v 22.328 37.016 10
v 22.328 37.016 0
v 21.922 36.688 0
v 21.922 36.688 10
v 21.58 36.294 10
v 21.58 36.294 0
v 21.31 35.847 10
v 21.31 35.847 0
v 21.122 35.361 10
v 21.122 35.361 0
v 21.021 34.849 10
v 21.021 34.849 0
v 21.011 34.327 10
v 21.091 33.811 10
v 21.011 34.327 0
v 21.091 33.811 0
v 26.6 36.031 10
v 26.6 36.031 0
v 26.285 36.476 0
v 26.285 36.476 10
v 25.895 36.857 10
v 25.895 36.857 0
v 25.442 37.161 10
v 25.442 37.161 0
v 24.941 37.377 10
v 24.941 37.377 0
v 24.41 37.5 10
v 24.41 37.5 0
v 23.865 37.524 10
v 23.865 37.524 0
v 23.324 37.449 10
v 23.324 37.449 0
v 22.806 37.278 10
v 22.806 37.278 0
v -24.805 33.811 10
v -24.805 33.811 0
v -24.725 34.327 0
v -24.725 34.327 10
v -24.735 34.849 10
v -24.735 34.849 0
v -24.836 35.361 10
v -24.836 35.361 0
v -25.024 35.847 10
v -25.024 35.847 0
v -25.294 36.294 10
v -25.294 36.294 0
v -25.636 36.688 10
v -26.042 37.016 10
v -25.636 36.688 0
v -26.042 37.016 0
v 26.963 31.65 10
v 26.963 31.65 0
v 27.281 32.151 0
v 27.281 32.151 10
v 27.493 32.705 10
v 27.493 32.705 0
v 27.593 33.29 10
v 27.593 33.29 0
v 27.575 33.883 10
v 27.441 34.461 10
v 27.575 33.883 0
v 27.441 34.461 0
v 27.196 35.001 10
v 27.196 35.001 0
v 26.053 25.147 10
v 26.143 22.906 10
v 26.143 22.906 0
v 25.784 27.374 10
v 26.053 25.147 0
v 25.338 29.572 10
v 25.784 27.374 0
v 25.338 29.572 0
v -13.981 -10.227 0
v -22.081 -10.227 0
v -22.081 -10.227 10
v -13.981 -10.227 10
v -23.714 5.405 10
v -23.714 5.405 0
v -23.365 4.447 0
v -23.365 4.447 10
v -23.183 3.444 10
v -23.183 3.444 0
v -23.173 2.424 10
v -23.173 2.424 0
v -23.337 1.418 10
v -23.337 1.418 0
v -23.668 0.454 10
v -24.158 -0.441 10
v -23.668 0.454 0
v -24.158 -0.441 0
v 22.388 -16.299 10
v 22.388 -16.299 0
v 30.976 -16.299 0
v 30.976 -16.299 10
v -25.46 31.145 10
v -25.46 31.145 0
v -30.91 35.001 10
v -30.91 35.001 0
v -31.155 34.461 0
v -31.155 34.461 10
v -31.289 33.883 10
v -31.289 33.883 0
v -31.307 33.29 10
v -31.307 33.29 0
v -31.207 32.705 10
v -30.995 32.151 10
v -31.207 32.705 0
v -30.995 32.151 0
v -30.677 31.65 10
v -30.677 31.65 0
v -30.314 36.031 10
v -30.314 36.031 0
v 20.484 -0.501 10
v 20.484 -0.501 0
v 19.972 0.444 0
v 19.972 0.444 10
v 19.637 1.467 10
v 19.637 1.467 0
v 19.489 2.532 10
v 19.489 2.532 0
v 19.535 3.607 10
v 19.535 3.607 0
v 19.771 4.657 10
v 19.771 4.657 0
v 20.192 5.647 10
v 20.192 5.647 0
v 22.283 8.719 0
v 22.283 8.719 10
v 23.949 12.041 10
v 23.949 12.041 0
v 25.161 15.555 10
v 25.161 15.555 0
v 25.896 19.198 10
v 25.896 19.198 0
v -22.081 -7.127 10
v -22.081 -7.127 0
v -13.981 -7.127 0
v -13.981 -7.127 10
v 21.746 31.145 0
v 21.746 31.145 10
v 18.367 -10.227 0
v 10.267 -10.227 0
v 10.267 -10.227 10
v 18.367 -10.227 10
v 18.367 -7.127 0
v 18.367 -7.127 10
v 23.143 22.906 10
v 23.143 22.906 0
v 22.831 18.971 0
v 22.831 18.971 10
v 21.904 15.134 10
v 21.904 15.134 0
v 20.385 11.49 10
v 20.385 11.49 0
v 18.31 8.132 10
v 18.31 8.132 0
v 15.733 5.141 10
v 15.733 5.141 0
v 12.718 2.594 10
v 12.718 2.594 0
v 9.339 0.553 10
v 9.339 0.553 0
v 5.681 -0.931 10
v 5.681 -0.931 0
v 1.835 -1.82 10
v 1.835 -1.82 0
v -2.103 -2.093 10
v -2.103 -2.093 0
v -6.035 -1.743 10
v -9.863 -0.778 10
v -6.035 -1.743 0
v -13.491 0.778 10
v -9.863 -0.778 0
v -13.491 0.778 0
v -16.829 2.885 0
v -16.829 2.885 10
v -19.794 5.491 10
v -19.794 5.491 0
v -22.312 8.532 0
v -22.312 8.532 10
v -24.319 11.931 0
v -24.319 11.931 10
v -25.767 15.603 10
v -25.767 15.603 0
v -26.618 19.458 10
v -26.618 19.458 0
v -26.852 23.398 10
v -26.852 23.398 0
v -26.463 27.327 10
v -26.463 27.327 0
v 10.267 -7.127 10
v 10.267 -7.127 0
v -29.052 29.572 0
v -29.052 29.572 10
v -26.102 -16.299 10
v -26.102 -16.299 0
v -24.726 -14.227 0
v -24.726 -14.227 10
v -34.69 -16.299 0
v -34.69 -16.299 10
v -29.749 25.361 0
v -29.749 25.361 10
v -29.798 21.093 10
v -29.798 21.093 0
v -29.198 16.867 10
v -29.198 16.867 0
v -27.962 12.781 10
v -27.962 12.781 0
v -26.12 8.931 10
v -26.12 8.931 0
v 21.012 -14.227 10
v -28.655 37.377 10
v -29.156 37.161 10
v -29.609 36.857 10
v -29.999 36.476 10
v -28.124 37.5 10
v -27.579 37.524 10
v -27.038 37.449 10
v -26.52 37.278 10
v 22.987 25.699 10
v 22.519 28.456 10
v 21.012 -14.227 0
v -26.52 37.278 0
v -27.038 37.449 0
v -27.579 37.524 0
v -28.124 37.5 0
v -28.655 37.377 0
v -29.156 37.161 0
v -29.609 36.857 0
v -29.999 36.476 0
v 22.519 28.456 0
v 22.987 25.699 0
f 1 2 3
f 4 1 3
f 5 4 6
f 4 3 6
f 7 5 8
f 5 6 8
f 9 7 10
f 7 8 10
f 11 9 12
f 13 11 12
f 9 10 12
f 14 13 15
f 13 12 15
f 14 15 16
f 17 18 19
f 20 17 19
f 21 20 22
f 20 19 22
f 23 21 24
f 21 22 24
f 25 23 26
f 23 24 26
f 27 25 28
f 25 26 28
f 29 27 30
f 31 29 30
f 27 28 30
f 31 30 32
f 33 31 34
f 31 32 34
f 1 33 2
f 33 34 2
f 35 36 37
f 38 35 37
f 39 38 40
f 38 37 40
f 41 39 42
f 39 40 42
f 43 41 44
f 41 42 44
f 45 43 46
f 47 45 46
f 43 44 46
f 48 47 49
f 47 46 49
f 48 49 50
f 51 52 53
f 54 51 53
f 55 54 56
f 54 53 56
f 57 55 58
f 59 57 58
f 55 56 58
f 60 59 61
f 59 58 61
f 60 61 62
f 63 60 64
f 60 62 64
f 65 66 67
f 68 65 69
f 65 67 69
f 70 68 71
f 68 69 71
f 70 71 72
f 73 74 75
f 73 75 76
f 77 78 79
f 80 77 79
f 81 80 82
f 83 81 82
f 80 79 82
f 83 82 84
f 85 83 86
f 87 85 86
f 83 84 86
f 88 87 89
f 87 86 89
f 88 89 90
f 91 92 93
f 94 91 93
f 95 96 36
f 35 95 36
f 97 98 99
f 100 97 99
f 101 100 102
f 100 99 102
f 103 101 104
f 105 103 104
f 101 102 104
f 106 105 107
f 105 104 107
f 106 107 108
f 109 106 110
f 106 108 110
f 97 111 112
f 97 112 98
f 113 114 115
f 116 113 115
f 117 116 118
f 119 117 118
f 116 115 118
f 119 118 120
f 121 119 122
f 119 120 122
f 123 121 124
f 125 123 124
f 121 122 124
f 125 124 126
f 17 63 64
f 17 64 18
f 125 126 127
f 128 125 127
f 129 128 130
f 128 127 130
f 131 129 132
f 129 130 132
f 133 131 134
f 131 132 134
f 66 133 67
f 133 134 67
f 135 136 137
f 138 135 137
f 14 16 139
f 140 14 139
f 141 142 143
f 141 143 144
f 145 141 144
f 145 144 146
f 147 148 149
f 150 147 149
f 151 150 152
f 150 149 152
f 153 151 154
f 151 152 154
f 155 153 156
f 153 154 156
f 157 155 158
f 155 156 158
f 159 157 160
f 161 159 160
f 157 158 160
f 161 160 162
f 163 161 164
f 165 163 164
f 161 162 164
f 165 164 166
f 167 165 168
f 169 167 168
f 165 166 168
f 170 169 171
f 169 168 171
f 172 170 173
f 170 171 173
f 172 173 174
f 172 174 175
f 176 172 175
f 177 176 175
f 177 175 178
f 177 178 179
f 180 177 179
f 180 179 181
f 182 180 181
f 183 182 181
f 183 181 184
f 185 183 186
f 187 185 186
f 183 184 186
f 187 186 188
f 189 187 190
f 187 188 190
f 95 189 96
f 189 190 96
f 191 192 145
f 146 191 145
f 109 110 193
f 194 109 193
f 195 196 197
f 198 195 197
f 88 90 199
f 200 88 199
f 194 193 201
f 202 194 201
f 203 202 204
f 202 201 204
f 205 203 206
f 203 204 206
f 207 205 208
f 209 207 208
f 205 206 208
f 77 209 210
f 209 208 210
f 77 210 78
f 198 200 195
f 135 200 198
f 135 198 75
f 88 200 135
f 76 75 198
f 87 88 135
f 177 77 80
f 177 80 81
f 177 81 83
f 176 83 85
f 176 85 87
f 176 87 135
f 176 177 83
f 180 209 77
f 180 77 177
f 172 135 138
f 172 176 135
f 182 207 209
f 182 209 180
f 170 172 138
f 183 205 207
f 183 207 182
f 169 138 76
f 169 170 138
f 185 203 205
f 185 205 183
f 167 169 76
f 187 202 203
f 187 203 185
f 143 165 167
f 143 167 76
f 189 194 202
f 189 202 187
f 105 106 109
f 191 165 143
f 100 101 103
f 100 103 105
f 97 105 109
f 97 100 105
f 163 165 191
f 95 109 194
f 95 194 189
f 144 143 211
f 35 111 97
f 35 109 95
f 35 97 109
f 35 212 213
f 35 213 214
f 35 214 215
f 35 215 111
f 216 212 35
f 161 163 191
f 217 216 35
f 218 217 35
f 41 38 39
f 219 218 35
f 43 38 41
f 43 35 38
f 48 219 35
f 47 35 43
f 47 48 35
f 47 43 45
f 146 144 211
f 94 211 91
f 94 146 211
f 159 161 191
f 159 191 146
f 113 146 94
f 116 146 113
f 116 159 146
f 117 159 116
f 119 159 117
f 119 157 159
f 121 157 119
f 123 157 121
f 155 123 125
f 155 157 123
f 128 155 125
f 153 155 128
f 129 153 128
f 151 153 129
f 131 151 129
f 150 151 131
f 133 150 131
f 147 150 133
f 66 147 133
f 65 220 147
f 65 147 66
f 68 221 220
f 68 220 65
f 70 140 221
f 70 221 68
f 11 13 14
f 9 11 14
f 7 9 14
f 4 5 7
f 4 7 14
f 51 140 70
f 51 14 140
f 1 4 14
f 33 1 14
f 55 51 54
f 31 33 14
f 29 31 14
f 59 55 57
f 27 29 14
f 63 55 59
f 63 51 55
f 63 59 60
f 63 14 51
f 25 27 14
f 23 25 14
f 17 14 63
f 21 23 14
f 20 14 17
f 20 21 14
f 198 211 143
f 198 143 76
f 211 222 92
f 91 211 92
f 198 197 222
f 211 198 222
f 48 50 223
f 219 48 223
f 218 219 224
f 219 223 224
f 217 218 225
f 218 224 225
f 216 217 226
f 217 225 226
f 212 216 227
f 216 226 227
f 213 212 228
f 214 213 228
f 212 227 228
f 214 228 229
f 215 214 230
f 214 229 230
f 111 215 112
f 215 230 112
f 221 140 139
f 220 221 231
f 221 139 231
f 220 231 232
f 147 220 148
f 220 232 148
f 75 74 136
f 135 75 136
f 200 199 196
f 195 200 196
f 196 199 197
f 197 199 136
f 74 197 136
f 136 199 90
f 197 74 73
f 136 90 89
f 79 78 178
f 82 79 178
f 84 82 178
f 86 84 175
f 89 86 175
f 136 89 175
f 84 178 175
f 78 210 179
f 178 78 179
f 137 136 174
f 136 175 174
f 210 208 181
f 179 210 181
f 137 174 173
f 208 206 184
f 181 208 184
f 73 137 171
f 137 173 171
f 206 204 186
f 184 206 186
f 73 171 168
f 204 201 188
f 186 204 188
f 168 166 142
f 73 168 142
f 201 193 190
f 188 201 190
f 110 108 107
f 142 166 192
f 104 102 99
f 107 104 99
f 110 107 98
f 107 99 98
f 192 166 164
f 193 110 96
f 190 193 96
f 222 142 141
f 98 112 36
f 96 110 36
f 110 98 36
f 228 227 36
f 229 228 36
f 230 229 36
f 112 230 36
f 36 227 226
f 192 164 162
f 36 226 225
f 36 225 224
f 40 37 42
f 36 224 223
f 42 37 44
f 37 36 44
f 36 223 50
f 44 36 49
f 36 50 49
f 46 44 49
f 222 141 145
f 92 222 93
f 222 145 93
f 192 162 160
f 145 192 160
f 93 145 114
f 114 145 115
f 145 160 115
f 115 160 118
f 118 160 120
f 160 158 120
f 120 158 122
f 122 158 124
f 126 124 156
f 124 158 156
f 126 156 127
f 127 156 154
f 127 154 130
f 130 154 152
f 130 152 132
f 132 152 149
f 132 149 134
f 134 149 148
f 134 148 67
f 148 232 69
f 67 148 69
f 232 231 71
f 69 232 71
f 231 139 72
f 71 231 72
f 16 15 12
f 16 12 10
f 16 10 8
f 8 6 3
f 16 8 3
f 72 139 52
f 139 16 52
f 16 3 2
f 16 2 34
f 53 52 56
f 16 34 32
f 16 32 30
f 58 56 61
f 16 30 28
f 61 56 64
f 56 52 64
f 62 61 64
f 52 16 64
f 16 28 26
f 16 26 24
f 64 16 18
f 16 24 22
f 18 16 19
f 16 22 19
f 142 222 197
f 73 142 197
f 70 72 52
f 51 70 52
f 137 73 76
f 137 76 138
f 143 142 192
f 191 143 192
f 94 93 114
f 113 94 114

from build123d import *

# Parameters (mm, degrees)
F0_W     = 8.1
F0_H     = 3.1
F1_DEPTH = 10


with BuildPart() as f1:
    # F0 (on Top) → F1 (new body)
    with BuildSketch(Plane.XY):
        with BuildLine():
            ThreePointArc((-29.051798, 29.572342), (-29.198001, 16.866823), (-23.713784, 5.404932))
            ThreePointArc((-23.713784, 5.404932), (-1.702548, -5.093764), (20.19153, 5.647114))
            ThreePointArc((20.19153, 5.647114), (24.613354, 13.777795), (26.143006, 22.90581))
            ThreePointArc((26.143006, 22.90581), (25.940978, 26.263301), (25.33781, 29.572342))
            ThreePointArc((25.33781, 29.572342), (24.101087, 33.402381), (22.32803, 37.015544))
            ThreePointArc((22.32803, 37.015544), (21.20556, 35.608031), (21.090924, 33.811397))
            Line((21.090924, 33.811397), (21.746385, 31.144773))
            ThreePointArc((21.746385, 31.144773), (22.791378, 27.084059), (23.143006, 22.90581))
            ThreePointArc((23.143006, 22.90581), (-6.035243, -1.742562), (-25.460373, 31.144773))
            Line((-25.460373, 31.144773), (-24.804912, 33.811397))
            ThreePointArc((-24.804912, 33.811397), (-24.919548, 35.608031), (-26.042018, 37.015544))
            ThreePointArc((-26.042018, 37.015544), (-27.815075, 33.402381), (-29.051798, 29.572342))
        make_face()
        with BuildLine():
            Line((-30.676976, 31.650005), (-29.051798, 29.572342))
            ThreePointArc((-29.051798, 29.572342), (-27.815075, 33.402381), (-26.042018, 37.015544))
            ThreePointArc((-26.042018, 37.015544), (-28.392122, 37.45081), (-30.314474, 36.030595))
            Line((-30.314474, 36.030595), (-30.910288, 35.001461))
            ThreePointArc((-30.910288, 35.001461), (-31.306766, 33.290011), (-30.676976, 31.650005))
        make_face()
        with BuildLine():
            ThreePointArc((26.600486, 36.030595), (24.678134, 37.45081), (22.32803, 37.015544))
            ThreePointArc((22.32803, 37.015544), (24.101087, 33.402381), (25.33781, 29.572342))
            Line((25.33781, 29.572342), (26.962988, 31.650005))
            ThreePointArc((26.962988, 31.650005), (27.592778, 33.290011), (27.1963, 35.001461))
            Line((27.1963, 35.001461), (26.600486, 36.030595))
        make_face()
        with BuildLine():
            ThreePointArc((-23.713784, 5.404932), (-23.173383, 2.424271), (-24.15798, -0.440505))
            Line((-24.15798, -0.440505), (-34.690085, -16.299085))
            Line((-34.690085, -16.299085), (-26.101912, -16.299085))
            Line((-26.101912, -16.299085), (-24.726056, -14.227407))
            Line((-24.726056, -14.227407), (-1.856994, -14.227407))
            Line((-1.856994, -14.227407), (21.012068, -14.227407))
            Line((21.012068, -14.227407), (22.387924, -16.299085))
            Line((22.387924, -16.299085), (30.976097, -16.299085))
            Line((30.976097, -16.299085), (20.484479, -0.501468))
            ThreePointArc((20.484479, -0.501468), (19.489432, 2.532393), (20.19153, 5.647114))
            ThreePointArc((20.19153, 5.647114), (-1.702548, -5.093764), (-23.713784, 5.404932))
        make_face()
        with Locations((-18.030923, -8.677407)):
            Rectangle(F0_W, F0_H, mode=Mode.SUBTRACT)
        with Locations((14.316935, -8.677407)):
            Rectangle(F0_W, F0_H, mode=Mode.SUBTRACT)
    extrude(amount=F1_DEPTH)


solid = f1.part
